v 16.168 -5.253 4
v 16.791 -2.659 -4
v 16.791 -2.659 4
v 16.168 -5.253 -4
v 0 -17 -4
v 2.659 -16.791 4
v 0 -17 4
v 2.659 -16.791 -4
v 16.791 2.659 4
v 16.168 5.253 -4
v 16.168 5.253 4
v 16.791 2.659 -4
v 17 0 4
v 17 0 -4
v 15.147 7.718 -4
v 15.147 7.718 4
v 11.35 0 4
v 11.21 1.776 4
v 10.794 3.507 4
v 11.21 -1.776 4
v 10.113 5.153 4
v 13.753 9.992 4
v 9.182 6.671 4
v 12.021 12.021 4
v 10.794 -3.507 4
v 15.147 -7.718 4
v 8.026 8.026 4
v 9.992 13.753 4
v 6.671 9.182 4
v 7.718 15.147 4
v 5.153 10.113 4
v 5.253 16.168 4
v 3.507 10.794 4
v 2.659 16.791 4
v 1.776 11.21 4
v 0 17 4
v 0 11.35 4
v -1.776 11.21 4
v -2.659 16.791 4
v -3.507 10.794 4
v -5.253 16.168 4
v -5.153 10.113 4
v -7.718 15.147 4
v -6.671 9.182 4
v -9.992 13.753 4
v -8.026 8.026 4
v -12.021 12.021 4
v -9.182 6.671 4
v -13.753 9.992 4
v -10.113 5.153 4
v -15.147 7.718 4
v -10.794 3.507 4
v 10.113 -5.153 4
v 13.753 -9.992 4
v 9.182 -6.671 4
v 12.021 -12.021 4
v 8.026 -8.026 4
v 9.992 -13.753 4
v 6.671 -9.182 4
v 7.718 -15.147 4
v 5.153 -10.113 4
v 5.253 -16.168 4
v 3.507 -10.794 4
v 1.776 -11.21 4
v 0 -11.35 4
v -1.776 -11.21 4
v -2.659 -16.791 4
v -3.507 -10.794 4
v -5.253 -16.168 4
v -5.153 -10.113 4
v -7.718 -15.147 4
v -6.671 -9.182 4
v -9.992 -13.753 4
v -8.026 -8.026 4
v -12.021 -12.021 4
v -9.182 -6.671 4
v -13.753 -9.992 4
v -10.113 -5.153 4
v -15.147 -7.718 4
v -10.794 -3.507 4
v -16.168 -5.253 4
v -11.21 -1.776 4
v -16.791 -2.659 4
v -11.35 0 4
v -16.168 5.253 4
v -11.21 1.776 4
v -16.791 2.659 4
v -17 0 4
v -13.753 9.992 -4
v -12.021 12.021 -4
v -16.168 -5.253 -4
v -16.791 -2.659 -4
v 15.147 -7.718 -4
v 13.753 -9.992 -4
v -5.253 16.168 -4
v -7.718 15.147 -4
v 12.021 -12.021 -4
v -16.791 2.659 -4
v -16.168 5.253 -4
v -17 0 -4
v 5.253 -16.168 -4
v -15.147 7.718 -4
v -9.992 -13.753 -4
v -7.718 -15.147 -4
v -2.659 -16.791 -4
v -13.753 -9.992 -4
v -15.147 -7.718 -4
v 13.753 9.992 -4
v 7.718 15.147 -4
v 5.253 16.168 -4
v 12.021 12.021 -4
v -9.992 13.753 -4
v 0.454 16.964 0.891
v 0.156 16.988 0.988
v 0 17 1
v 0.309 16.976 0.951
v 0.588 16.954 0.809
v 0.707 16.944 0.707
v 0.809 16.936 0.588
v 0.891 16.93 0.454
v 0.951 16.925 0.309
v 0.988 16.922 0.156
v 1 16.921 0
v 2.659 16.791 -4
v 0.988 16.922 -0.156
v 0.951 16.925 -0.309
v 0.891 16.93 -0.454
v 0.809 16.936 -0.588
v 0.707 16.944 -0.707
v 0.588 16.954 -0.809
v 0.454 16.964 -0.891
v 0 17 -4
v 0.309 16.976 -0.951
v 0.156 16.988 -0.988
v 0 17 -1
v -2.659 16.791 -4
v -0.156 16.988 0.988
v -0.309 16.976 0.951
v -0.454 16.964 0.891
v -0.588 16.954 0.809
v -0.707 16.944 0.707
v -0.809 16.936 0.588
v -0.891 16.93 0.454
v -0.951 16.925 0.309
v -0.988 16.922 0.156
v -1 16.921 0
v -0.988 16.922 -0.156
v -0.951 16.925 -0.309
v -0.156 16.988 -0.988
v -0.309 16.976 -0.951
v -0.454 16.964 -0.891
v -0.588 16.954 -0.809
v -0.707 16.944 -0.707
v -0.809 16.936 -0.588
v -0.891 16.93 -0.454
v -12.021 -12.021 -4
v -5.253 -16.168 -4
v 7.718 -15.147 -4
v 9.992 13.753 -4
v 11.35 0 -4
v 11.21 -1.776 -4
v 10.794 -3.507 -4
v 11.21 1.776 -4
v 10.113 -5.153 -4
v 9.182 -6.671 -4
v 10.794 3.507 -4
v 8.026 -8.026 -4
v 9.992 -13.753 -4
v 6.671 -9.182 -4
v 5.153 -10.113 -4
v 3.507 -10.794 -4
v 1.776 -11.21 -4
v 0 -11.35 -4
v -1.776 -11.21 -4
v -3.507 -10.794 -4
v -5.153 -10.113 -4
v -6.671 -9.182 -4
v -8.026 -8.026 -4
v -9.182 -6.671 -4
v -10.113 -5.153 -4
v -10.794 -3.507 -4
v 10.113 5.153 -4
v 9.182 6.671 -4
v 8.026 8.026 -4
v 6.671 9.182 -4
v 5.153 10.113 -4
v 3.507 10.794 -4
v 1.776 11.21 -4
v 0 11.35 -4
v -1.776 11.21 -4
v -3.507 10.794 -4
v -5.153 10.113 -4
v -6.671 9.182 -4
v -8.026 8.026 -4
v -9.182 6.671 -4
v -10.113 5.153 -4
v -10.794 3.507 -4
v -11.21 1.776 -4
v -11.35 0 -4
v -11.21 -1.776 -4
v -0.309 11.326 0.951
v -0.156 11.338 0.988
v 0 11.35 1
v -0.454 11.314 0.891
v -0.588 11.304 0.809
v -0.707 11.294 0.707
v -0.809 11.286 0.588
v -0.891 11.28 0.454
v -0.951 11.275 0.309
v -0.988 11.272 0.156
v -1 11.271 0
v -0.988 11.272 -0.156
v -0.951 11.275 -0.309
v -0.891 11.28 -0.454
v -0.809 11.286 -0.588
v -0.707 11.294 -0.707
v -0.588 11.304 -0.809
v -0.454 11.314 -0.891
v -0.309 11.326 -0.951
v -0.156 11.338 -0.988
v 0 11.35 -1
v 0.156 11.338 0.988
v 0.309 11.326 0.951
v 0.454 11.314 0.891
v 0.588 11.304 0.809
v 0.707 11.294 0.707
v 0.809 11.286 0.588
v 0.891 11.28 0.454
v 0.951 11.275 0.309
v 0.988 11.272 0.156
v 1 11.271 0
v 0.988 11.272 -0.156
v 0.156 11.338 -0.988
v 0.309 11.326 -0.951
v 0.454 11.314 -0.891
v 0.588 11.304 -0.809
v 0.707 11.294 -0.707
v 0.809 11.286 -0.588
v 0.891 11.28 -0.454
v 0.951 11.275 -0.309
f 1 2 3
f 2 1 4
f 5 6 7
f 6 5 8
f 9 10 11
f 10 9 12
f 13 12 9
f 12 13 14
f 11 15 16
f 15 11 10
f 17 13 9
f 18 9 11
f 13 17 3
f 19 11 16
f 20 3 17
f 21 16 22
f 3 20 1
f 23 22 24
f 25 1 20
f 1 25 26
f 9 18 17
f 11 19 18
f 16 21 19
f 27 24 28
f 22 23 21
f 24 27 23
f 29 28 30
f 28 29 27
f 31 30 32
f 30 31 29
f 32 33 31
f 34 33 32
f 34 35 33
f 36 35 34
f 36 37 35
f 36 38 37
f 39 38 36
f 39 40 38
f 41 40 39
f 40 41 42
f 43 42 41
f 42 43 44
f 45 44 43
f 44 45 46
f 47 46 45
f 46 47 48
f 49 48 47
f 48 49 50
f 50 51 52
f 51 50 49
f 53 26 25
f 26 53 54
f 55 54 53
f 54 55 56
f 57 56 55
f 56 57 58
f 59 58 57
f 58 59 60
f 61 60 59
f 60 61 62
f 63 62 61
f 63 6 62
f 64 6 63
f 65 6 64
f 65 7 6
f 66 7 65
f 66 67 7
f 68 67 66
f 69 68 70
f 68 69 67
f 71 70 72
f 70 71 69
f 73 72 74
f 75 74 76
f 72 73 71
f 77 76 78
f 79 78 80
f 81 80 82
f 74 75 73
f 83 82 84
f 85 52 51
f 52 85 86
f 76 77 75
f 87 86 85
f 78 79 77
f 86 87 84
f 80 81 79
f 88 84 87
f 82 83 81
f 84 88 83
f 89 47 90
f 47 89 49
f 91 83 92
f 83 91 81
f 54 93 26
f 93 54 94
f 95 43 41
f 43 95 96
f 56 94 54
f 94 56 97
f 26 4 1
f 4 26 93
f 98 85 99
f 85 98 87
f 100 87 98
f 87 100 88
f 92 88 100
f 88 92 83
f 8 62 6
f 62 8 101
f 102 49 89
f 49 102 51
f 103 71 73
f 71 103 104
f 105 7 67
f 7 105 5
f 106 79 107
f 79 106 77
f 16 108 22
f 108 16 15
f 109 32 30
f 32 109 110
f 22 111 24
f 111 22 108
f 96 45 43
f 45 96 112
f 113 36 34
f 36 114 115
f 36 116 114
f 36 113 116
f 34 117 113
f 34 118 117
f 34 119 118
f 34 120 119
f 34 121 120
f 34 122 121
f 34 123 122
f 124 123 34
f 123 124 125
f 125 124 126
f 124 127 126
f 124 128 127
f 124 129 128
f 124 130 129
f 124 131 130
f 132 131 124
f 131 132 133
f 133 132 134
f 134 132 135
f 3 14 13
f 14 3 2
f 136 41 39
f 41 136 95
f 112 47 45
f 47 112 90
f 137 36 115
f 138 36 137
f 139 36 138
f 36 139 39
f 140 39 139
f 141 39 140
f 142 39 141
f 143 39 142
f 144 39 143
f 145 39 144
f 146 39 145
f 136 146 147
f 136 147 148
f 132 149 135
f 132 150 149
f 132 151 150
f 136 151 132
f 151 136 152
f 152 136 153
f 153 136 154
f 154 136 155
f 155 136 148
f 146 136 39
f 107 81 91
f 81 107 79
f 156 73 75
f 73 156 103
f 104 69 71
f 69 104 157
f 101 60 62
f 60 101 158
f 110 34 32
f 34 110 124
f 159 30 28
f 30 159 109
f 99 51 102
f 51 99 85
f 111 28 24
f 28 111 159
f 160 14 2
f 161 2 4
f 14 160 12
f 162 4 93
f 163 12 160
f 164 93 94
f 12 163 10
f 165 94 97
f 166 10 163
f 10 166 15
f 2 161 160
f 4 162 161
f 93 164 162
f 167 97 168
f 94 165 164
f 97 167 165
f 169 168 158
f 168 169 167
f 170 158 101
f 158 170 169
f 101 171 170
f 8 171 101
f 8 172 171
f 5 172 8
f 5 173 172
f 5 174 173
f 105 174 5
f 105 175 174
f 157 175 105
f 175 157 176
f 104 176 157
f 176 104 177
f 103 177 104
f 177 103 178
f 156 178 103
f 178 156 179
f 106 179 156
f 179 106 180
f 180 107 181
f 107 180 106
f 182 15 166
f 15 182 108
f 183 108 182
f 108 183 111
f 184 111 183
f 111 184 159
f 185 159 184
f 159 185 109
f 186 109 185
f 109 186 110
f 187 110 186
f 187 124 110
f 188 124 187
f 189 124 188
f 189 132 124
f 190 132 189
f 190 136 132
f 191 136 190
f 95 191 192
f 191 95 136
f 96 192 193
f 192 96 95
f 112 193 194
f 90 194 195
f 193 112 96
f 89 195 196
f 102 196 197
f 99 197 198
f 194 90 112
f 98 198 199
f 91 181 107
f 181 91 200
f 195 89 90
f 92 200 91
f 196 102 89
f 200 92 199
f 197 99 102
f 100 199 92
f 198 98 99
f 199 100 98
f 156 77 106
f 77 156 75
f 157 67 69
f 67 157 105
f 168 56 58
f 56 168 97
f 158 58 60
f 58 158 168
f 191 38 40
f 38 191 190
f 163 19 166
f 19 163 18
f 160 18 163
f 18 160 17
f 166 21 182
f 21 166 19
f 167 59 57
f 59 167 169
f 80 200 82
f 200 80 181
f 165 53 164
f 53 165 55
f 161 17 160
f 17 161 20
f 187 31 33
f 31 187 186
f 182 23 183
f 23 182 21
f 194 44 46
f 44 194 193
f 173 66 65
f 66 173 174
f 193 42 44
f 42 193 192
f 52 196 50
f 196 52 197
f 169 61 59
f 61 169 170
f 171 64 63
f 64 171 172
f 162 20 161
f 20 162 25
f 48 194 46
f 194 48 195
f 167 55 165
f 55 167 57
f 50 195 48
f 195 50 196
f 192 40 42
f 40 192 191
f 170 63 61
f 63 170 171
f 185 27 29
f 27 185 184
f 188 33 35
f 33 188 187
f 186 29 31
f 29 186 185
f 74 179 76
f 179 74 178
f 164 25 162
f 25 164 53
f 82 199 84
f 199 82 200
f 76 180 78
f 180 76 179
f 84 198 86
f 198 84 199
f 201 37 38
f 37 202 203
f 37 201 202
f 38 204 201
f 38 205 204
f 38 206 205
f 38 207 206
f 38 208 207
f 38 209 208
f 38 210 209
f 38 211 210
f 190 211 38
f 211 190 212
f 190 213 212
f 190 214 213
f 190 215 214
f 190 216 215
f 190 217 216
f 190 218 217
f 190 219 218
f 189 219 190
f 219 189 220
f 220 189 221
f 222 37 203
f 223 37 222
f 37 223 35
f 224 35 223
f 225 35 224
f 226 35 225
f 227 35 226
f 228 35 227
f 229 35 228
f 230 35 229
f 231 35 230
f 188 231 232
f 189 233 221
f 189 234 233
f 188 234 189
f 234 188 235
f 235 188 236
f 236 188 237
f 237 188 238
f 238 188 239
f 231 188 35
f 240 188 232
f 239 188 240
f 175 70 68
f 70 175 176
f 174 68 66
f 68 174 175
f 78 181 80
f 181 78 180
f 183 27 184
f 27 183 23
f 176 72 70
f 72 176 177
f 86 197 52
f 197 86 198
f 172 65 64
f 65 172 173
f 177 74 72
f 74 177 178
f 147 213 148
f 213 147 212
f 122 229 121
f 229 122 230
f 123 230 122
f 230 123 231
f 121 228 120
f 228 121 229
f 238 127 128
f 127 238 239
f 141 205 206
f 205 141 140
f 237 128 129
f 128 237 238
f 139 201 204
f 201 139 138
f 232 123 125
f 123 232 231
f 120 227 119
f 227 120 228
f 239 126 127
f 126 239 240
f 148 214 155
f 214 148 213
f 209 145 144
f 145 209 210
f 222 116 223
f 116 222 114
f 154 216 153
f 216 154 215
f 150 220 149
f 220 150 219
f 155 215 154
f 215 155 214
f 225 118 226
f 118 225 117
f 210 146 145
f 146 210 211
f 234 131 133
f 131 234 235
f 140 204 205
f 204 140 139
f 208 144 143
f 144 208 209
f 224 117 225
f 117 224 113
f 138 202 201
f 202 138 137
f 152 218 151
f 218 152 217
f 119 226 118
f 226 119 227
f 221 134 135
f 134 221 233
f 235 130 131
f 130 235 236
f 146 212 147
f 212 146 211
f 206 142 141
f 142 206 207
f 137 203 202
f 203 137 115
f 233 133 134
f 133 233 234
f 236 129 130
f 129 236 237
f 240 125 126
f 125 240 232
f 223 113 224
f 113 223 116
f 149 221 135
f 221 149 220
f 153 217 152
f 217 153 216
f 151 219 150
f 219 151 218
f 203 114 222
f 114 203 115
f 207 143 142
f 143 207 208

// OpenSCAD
//Author: Piotr Paterek, Kraków 05-08.2016
$fn=40;
difference()
{
    difference()
    {
        cylinder(r=17,h=8, center=true);
        cylinder(r=11.35,h=8, center=true);
    }
    translate([0,14,0])
    {
        rotate(a=90,v=[1,0,0])
        {
            cylinder(r=1,h=8,center=true);
        }
    }
}
